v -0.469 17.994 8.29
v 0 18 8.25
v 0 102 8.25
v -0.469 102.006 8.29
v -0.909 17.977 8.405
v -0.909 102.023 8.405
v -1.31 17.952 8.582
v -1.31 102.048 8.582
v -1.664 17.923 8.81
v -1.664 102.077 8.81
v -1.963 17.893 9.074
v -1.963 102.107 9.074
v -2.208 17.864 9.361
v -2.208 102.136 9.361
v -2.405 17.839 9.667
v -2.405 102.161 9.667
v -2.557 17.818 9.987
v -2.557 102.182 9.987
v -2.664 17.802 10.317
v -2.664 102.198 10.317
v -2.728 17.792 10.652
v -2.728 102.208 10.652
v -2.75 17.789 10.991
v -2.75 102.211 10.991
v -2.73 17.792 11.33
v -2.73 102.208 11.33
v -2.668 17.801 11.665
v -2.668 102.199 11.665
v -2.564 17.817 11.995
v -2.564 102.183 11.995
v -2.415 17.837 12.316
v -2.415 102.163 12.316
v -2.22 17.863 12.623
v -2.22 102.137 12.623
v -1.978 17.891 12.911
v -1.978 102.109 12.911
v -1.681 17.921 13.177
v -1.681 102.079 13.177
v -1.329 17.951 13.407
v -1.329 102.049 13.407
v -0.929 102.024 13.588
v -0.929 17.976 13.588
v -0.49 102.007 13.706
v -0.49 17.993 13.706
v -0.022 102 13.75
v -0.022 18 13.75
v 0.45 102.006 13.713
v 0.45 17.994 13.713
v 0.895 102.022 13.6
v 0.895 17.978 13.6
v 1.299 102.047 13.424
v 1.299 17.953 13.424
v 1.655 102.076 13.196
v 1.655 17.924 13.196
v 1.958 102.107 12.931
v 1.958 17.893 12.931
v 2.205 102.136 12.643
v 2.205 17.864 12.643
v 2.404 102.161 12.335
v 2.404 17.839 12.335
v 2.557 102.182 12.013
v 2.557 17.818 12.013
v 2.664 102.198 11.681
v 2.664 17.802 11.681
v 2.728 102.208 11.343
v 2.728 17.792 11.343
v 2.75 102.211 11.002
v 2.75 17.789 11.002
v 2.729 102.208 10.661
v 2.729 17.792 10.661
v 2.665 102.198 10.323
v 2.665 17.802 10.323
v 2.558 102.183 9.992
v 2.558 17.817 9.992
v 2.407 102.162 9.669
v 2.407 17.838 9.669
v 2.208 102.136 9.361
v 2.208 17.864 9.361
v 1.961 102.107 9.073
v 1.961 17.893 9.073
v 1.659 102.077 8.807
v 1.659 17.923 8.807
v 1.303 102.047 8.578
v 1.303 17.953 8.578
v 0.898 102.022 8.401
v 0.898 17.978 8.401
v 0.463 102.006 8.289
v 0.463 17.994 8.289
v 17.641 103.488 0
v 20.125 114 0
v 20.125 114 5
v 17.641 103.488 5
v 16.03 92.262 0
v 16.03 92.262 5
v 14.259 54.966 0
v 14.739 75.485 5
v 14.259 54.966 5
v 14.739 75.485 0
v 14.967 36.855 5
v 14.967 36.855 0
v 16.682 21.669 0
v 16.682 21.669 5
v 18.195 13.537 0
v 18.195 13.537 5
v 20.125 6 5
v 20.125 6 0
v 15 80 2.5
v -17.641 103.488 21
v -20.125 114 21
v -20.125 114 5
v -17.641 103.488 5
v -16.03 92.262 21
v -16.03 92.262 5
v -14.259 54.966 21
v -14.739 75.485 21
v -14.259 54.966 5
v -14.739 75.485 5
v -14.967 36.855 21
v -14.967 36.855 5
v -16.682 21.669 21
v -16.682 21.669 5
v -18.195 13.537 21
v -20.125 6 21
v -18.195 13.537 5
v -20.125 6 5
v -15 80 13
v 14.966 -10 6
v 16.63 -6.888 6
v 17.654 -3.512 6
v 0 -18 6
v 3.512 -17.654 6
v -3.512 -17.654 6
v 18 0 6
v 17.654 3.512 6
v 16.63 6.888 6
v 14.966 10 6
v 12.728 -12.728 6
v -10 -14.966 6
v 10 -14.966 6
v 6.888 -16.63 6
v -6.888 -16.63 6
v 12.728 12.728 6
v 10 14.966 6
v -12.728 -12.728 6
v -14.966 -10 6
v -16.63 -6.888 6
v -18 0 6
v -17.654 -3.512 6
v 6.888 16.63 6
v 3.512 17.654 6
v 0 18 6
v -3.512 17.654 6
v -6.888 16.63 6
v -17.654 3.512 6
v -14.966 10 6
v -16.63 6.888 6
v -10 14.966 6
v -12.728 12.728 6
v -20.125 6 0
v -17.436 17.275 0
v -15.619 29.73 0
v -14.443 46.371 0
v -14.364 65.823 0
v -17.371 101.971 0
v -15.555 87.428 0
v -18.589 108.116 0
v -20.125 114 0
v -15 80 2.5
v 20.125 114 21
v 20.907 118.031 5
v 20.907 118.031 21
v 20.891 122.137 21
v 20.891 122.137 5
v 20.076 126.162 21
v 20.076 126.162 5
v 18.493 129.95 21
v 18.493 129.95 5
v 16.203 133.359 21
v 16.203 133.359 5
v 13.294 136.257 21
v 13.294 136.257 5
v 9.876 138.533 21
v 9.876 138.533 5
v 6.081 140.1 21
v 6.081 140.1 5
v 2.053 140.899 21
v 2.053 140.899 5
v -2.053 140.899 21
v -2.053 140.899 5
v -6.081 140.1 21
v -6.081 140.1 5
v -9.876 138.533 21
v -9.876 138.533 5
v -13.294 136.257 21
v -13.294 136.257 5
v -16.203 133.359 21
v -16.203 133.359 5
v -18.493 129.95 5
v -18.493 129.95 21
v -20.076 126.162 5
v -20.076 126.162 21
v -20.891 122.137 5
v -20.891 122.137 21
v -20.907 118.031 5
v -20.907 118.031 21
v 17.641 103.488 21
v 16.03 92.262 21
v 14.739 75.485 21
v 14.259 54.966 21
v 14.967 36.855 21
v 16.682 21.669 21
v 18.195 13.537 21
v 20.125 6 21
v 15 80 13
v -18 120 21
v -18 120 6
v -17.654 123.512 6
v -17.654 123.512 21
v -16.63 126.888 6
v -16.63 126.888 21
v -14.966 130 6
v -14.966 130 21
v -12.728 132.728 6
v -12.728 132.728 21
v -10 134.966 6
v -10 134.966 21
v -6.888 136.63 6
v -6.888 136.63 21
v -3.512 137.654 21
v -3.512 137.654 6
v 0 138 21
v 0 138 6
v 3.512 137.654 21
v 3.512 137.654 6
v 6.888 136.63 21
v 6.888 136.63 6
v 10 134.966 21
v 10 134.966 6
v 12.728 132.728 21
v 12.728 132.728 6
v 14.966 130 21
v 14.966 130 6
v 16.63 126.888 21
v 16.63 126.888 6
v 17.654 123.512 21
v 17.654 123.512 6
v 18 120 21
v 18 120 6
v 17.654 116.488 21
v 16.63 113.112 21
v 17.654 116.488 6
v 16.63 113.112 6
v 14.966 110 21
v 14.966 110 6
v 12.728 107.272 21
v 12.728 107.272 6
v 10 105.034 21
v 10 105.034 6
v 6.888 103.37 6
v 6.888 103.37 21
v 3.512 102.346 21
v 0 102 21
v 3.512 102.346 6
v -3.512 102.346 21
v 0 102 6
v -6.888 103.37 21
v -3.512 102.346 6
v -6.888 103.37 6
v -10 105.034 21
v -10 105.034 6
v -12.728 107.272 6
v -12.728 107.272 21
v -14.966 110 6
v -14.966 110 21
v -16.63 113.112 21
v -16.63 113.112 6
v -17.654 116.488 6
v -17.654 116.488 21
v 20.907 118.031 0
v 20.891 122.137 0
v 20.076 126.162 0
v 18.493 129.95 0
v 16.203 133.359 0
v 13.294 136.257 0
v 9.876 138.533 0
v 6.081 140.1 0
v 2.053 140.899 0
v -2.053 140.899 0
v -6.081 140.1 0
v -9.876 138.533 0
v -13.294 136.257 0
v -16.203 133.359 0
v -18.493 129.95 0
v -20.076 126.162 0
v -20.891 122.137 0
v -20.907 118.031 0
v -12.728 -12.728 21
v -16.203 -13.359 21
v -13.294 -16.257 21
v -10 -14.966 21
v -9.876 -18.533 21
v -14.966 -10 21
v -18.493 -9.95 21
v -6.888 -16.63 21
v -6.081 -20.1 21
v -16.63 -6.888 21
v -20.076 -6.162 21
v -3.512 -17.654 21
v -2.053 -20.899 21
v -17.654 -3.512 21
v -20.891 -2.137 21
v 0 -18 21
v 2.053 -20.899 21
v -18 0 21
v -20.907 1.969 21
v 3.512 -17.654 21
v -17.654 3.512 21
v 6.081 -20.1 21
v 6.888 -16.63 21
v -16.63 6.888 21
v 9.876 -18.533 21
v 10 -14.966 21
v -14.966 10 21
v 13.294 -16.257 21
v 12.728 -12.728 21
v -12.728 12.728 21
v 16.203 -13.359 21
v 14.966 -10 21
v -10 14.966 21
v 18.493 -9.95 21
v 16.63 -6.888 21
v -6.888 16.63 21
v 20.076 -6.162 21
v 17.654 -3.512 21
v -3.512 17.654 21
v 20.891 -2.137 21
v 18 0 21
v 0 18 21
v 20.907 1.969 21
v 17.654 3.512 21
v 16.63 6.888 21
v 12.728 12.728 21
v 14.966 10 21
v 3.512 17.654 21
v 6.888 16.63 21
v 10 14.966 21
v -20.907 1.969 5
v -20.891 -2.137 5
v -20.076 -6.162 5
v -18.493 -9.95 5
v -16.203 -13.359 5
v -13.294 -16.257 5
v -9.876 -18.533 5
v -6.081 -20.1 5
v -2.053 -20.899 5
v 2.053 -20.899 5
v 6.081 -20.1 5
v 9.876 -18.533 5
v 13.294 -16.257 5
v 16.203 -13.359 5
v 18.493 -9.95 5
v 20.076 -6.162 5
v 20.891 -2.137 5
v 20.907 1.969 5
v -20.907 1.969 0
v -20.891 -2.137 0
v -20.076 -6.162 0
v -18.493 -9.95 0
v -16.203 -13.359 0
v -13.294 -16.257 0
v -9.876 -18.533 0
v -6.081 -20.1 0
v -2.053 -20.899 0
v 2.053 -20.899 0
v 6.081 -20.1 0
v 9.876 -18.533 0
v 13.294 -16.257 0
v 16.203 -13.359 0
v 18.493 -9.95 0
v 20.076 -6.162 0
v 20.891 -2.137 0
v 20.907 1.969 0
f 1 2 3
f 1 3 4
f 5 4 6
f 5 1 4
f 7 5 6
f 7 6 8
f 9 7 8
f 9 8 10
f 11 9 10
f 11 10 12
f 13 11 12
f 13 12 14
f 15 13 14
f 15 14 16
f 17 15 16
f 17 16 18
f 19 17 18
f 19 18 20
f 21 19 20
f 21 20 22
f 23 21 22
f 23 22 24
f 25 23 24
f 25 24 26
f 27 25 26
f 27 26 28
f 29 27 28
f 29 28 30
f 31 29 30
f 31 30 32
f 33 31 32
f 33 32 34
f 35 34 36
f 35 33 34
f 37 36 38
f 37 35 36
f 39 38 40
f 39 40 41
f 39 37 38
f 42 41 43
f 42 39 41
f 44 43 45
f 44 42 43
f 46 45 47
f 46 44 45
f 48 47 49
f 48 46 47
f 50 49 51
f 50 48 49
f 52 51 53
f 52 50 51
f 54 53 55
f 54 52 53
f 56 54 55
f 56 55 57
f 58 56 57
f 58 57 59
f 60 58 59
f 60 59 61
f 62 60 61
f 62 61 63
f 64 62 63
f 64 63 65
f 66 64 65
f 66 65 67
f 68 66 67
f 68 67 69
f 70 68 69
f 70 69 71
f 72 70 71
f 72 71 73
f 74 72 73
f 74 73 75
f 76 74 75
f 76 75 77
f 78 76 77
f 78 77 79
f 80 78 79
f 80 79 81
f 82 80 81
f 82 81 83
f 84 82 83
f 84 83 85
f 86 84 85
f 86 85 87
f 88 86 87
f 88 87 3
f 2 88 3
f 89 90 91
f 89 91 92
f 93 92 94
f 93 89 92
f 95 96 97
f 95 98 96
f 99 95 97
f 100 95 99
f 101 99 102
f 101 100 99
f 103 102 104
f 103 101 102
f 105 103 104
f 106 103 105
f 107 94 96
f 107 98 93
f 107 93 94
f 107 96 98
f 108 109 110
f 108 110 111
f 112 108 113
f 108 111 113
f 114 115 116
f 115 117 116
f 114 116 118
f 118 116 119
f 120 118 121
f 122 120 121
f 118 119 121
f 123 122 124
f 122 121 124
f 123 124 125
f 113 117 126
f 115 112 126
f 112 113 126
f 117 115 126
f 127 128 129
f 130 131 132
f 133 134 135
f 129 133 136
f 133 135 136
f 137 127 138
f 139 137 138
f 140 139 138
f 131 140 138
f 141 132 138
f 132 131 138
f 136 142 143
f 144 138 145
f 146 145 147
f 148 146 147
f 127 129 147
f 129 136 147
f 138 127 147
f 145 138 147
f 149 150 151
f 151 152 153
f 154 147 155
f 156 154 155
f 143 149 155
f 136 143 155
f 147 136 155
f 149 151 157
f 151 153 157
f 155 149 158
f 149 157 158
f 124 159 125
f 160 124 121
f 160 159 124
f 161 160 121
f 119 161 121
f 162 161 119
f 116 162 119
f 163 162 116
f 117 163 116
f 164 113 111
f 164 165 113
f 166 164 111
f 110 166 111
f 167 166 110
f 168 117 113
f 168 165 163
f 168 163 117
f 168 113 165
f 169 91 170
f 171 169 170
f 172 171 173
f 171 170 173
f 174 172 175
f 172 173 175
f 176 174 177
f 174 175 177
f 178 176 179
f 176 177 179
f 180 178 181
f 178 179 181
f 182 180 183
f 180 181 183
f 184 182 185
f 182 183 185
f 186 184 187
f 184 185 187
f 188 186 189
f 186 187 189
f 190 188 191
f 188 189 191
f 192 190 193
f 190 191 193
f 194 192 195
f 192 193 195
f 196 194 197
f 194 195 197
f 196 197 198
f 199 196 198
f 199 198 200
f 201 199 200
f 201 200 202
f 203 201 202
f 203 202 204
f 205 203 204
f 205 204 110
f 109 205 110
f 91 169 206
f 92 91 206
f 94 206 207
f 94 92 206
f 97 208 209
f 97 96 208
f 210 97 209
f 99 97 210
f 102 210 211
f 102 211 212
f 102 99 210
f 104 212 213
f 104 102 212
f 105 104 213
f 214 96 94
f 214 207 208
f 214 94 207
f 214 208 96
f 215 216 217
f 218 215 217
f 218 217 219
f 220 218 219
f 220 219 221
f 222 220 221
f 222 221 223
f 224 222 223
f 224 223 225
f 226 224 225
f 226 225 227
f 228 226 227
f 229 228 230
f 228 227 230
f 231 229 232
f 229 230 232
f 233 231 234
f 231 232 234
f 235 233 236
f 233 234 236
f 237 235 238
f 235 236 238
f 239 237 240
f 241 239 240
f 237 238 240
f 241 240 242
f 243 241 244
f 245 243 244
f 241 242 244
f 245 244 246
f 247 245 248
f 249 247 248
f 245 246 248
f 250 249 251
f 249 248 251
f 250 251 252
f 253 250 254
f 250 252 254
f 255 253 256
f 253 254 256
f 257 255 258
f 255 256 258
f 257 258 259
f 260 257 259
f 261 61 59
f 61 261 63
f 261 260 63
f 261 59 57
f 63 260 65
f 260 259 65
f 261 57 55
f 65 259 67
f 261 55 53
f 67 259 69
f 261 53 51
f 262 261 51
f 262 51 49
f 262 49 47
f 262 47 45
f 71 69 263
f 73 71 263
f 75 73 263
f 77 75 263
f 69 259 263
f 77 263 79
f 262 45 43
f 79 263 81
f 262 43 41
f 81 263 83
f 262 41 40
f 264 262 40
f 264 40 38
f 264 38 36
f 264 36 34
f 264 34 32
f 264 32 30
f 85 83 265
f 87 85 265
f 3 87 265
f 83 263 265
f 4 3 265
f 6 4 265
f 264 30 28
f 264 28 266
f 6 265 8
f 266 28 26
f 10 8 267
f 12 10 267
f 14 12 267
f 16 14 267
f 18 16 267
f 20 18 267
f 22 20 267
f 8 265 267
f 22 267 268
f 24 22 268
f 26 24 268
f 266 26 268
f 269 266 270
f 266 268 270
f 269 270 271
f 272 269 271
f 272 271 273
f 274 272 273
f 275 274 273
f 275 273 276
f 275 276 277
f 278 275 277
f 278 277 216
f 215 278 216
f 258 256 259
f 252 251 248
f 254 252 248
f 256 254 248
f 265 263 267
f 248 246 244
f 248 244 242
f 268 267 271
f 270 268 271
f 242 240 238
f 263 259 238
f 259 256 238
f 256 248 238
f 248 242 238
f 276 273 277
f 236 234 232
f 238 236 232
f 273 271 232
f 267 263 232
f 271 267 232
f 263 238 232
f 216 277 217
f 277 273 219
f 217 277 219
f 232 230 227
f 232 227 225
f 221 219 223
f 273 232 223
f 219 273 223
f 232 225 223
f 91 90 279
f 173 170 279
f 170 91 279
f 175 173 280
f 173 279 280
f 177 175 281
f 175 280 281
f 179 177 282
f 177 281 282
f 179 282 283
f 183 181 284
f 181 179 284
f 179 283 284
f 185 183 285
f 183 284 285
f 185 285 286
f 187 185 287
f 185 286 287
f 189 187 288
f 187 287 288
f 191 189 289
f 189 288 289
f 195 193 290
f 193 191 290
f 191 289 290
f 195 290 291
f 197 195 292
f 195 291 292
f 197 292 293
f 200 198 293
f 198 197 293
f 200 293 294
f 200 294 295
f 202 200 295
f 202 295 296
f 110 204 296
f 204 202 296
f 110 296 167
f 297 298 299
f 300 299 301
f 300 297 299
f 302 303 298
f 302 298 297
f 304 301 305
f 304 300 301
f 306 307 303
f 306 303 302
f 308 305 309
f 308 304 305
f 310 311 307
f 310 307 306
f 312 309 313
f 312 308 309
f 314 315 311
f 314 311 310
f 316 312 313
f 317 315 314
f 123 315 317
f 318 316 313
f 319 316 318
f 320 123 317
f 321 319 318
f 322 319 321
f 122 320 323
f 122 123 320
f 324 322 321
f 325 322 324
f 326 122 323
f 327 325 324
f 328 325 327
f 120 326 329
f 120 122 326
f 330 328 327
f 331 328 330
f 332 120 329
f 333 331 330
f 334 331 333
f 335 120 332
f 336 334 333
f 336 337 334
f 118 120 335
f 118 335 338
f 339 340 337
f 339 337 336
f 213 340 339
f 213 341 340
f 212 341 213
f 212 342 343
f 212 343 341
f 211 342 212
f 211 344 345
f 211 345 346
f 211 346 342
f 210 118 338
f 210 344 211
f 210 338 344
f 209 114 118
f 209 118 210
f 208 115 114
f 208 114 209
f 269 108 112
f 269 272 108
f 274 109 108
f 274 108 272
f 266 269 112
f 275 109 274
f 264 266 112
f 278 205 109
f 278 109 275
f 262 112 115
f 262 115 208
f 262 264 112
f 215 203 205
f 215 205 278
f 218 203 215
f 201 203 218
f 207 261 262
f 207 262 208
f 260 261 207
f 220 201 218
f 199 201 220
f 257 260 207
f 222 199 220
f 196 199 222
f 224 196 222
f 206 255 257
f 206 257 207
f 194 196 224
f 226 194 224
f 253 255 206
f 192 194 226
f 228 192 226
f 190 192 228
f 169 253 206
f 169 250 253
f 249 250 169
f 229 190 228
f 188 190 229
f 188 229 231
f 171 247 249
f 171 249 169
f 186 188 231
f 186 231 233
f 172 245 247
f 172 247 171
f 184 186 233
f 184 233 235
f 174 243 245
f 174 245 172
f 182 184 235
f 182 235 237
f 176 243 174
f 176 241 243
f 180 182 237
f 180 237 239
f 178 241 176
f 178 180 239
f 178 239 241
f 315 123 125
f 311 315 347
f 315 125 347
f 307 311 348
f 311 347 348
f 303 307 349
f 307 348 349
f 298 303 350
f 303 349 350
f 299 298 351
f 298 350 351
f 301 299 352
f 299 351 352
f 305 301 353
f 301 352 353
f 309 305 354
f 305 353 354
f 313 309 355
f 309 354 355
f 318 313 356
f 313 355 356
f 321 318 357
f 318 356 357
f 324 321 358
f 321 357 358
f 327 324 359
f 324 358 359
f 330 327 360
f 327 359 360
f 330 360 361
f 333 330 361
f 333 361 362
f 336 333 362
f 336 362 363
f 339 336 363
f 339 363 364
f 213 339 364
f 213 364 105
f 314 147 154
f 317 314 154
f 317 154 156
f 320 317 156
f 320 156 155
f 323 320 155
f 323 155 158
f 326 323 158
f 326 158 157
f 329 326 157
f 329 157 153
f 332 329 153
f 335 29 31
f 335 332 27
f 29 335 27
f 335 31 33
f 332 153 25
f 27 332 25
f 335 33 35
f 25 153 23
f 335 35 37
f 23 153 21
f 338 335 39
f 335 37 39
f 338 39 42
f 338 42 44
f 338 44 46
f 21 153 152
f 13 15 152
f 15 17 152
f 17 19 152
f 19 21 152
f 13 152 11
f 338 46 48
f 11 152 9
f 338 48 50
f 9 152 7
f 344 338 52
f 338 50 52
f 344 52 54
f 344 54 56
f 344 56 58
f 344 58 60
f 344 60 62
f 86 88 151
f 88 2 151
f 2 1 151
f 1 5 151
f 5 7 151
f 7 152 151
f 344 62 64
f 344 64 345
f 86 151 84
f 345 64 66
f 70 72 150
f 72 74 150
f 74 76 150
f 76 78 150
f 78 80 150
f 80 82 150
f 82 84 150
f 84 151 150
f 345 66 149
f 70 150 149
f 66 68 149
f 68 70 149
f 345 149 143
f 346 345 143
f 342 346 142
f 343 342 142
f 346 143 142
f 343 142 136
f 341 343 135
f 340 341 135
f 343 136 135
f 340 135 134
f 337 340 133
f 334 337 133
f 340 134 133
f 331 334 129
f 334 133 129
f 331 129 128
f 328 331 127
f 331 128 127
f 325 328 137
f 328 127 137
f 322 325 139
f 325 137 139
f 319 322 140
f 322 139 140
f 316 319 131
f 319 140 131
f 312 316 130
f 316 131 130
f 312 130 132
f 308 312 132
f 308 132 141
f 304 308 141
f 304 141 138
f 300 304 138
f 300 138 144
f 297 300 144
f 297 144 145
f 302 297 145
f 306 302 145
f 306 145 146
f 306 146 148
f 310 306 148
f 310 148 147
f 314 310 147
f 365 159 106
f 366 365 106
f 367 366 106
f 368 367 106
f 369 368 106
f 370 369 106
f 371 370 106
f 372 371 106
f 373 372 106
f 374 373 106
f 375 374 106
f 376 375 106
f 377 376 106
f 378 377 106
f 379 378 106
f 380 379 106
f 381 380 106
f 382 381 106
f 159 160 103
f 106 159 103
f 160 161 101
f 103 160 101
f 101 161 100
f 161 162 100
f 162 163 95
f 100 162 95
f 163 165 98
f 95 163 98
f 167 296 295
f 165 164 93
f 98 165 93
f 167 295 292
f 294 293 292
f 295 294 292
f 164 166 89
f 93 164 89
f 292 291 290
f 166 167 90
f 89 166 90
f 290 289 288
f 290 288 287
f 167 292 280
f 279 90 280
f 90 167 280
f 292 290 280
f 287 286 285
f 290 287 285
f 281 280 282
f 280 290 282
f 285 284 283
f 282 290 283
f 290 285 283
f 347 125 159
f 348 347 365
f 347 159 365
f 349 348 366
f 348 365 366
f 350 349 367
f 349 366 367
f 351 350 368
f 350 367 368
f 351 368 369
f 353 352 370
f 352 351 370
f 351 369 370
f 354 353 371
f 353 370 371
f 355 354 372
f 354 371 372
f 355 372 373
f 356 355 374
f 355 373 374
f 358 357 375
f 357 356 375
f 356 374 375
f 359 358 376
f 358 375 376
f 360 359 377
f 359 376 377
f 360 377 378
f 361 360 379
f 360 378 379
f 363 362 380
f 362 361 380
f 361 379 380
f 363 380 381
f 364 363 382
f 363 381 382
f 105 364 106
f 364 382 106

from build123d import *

# Parameters (mm, degrees)
SKETCH1_R             = 21
BOSS_EXTRUDE2_DEPTH   = 5
BOSS_EXTRUDE2_2_DEPTH = 5
BOSS_EXTRUDE5_DEPTH   = 16
SKETCH8_R             = 18
CUT_EXTRUDE3_DEPTH    = 144.342247908
BOSS_EXTRUDE6_START   = 5
BOSS_EXTRUDE6_DEPTH   = 5
SKETCH10_R            = 2.75
CUT_EXTRUDE4_DEPTH    = 114


with BuildPart() as part:
    # Sketch1 → Boss-Extrude2 (new body)
    with BuildSketch(Plane.XY):
        with Locations((0, 120)):
            Circle(SKETCH1_R)
    extrude(amount=BOSS_EXTRUDE2_DEPTH)



with BuildPart() as body_2:
    # Sketch1 → Boss-Extrude2 2 (new body)
    with BuildSketch(Plane.XY):
        Circle(SKETCH1_R)
    extrude(amount=BOSS_EXTRUDE2_2_DEPTH)


with BuildPart() as part_1:
    add(part.part)

    add(body_2.part)  # Boss-Extrude5 merges body 2
    # Sketch5 → Boss-Extrude5 (add)
    with BuildSketch(Plane.XY.offset(5)):
        with BuildLine():
            add(Edge.make_bspline(
                [(-20.124611797, 114), (-17.072662318, 103.763450251), (-12.954200117, 66.897613413), (-14.18067636, 25.936565539), (-20.124611797, 6)],
                knots=[0, 0, 0, 0, 0.316724685, 1, 1, 1, 1], degree=3))
            ThreePointArc((-20.124611797, 6), (0, -21), (20.124611797, 6))
            add(Edge.make_bspline(
                [(20.124611797, 114), (17.072662318, 103.763450251), (12.954200117, 66.897613413), (14.18067636, 25.936565539), (20.124611797, 6)],
                knots=[0, 0, 0, 0, 0.316724685, 1, 1, 1, 1], degree=3))
            ThreePointArc((20.124611797, 114), (0, 141), (-20.124611797, 114))
        make_face()
    extrude(amount=BOSS_EXTRUDE5_DEPTH)

    # Sketch8 → Cut-Extrude3 (cut, through all)
    with BuildSketch(Plane(origin=(0, 0, 6), x_dir=(-1, 0, 0), z_dir=(0, 0, -1))):
        with Locations((0, 120)):
            Circle(SKETCH8_R)
        Circle(SKETCH8_R)
    extrude(amount=-CUT_EXTRUDE3_DEPTH, mode=Mode.SUBTRACT)

    # Sketch9 → Boss-Extrude6 (add)
    with BuildSketch(Plane(origin=(0, 0, 5), x_dir=(-1, 0, 0), z_dir=(0, 0, -1)).offset(BOSS_EXTRUDE6_START)):
        with BuildLine():
            ThreePointArc((-20.124611797, 114), (0, 99), (20.124611797, 114))
            add(Edge.make_bspline(
                [(20.124611797, 6), (14.18067636, 25.936565539), (12.954200117, 66.897613413), (17.072662318, 103.763450251), (20.124611797, 114)],
                knots=[0, 0, 0, 0, 0.683275315, 1, 1, 1, 1], degree=3))
            ThreePointArc((20.124611797, 6), (0, 21), (-20.124611797, 6))
            add(Edge.make_bspline(
                [(-20.124611797, 114), (-17.072662318, 103.763450251), (-12.954200117, 66.897613413), (-14.18067636, 25.936565539), (-20.124611797, 6)],
                knots=[0, 0, 0, 0, 0.316724685, 1, 1, 1, 1], degree=3))
        make_face()
    extrude(amount=-BOSS_EXTRUDE6_DEPTH)

    # Sketch10 → Cut-Extrude4 (cut)
    with BuildSketch(Plane(origin=(0, 0, 0), x_dir=(1, 0, 0), z_dir=(0, 1, 0))):
        with Locations(Location((0, -11, 0), (0, 0, 90))):
            Circle(SKETCH10_R)
    extrude(amount=CUT_EXTRUDE4_DEPTH, mode=Mode.SUBTRACT)


solid = part_1.part
